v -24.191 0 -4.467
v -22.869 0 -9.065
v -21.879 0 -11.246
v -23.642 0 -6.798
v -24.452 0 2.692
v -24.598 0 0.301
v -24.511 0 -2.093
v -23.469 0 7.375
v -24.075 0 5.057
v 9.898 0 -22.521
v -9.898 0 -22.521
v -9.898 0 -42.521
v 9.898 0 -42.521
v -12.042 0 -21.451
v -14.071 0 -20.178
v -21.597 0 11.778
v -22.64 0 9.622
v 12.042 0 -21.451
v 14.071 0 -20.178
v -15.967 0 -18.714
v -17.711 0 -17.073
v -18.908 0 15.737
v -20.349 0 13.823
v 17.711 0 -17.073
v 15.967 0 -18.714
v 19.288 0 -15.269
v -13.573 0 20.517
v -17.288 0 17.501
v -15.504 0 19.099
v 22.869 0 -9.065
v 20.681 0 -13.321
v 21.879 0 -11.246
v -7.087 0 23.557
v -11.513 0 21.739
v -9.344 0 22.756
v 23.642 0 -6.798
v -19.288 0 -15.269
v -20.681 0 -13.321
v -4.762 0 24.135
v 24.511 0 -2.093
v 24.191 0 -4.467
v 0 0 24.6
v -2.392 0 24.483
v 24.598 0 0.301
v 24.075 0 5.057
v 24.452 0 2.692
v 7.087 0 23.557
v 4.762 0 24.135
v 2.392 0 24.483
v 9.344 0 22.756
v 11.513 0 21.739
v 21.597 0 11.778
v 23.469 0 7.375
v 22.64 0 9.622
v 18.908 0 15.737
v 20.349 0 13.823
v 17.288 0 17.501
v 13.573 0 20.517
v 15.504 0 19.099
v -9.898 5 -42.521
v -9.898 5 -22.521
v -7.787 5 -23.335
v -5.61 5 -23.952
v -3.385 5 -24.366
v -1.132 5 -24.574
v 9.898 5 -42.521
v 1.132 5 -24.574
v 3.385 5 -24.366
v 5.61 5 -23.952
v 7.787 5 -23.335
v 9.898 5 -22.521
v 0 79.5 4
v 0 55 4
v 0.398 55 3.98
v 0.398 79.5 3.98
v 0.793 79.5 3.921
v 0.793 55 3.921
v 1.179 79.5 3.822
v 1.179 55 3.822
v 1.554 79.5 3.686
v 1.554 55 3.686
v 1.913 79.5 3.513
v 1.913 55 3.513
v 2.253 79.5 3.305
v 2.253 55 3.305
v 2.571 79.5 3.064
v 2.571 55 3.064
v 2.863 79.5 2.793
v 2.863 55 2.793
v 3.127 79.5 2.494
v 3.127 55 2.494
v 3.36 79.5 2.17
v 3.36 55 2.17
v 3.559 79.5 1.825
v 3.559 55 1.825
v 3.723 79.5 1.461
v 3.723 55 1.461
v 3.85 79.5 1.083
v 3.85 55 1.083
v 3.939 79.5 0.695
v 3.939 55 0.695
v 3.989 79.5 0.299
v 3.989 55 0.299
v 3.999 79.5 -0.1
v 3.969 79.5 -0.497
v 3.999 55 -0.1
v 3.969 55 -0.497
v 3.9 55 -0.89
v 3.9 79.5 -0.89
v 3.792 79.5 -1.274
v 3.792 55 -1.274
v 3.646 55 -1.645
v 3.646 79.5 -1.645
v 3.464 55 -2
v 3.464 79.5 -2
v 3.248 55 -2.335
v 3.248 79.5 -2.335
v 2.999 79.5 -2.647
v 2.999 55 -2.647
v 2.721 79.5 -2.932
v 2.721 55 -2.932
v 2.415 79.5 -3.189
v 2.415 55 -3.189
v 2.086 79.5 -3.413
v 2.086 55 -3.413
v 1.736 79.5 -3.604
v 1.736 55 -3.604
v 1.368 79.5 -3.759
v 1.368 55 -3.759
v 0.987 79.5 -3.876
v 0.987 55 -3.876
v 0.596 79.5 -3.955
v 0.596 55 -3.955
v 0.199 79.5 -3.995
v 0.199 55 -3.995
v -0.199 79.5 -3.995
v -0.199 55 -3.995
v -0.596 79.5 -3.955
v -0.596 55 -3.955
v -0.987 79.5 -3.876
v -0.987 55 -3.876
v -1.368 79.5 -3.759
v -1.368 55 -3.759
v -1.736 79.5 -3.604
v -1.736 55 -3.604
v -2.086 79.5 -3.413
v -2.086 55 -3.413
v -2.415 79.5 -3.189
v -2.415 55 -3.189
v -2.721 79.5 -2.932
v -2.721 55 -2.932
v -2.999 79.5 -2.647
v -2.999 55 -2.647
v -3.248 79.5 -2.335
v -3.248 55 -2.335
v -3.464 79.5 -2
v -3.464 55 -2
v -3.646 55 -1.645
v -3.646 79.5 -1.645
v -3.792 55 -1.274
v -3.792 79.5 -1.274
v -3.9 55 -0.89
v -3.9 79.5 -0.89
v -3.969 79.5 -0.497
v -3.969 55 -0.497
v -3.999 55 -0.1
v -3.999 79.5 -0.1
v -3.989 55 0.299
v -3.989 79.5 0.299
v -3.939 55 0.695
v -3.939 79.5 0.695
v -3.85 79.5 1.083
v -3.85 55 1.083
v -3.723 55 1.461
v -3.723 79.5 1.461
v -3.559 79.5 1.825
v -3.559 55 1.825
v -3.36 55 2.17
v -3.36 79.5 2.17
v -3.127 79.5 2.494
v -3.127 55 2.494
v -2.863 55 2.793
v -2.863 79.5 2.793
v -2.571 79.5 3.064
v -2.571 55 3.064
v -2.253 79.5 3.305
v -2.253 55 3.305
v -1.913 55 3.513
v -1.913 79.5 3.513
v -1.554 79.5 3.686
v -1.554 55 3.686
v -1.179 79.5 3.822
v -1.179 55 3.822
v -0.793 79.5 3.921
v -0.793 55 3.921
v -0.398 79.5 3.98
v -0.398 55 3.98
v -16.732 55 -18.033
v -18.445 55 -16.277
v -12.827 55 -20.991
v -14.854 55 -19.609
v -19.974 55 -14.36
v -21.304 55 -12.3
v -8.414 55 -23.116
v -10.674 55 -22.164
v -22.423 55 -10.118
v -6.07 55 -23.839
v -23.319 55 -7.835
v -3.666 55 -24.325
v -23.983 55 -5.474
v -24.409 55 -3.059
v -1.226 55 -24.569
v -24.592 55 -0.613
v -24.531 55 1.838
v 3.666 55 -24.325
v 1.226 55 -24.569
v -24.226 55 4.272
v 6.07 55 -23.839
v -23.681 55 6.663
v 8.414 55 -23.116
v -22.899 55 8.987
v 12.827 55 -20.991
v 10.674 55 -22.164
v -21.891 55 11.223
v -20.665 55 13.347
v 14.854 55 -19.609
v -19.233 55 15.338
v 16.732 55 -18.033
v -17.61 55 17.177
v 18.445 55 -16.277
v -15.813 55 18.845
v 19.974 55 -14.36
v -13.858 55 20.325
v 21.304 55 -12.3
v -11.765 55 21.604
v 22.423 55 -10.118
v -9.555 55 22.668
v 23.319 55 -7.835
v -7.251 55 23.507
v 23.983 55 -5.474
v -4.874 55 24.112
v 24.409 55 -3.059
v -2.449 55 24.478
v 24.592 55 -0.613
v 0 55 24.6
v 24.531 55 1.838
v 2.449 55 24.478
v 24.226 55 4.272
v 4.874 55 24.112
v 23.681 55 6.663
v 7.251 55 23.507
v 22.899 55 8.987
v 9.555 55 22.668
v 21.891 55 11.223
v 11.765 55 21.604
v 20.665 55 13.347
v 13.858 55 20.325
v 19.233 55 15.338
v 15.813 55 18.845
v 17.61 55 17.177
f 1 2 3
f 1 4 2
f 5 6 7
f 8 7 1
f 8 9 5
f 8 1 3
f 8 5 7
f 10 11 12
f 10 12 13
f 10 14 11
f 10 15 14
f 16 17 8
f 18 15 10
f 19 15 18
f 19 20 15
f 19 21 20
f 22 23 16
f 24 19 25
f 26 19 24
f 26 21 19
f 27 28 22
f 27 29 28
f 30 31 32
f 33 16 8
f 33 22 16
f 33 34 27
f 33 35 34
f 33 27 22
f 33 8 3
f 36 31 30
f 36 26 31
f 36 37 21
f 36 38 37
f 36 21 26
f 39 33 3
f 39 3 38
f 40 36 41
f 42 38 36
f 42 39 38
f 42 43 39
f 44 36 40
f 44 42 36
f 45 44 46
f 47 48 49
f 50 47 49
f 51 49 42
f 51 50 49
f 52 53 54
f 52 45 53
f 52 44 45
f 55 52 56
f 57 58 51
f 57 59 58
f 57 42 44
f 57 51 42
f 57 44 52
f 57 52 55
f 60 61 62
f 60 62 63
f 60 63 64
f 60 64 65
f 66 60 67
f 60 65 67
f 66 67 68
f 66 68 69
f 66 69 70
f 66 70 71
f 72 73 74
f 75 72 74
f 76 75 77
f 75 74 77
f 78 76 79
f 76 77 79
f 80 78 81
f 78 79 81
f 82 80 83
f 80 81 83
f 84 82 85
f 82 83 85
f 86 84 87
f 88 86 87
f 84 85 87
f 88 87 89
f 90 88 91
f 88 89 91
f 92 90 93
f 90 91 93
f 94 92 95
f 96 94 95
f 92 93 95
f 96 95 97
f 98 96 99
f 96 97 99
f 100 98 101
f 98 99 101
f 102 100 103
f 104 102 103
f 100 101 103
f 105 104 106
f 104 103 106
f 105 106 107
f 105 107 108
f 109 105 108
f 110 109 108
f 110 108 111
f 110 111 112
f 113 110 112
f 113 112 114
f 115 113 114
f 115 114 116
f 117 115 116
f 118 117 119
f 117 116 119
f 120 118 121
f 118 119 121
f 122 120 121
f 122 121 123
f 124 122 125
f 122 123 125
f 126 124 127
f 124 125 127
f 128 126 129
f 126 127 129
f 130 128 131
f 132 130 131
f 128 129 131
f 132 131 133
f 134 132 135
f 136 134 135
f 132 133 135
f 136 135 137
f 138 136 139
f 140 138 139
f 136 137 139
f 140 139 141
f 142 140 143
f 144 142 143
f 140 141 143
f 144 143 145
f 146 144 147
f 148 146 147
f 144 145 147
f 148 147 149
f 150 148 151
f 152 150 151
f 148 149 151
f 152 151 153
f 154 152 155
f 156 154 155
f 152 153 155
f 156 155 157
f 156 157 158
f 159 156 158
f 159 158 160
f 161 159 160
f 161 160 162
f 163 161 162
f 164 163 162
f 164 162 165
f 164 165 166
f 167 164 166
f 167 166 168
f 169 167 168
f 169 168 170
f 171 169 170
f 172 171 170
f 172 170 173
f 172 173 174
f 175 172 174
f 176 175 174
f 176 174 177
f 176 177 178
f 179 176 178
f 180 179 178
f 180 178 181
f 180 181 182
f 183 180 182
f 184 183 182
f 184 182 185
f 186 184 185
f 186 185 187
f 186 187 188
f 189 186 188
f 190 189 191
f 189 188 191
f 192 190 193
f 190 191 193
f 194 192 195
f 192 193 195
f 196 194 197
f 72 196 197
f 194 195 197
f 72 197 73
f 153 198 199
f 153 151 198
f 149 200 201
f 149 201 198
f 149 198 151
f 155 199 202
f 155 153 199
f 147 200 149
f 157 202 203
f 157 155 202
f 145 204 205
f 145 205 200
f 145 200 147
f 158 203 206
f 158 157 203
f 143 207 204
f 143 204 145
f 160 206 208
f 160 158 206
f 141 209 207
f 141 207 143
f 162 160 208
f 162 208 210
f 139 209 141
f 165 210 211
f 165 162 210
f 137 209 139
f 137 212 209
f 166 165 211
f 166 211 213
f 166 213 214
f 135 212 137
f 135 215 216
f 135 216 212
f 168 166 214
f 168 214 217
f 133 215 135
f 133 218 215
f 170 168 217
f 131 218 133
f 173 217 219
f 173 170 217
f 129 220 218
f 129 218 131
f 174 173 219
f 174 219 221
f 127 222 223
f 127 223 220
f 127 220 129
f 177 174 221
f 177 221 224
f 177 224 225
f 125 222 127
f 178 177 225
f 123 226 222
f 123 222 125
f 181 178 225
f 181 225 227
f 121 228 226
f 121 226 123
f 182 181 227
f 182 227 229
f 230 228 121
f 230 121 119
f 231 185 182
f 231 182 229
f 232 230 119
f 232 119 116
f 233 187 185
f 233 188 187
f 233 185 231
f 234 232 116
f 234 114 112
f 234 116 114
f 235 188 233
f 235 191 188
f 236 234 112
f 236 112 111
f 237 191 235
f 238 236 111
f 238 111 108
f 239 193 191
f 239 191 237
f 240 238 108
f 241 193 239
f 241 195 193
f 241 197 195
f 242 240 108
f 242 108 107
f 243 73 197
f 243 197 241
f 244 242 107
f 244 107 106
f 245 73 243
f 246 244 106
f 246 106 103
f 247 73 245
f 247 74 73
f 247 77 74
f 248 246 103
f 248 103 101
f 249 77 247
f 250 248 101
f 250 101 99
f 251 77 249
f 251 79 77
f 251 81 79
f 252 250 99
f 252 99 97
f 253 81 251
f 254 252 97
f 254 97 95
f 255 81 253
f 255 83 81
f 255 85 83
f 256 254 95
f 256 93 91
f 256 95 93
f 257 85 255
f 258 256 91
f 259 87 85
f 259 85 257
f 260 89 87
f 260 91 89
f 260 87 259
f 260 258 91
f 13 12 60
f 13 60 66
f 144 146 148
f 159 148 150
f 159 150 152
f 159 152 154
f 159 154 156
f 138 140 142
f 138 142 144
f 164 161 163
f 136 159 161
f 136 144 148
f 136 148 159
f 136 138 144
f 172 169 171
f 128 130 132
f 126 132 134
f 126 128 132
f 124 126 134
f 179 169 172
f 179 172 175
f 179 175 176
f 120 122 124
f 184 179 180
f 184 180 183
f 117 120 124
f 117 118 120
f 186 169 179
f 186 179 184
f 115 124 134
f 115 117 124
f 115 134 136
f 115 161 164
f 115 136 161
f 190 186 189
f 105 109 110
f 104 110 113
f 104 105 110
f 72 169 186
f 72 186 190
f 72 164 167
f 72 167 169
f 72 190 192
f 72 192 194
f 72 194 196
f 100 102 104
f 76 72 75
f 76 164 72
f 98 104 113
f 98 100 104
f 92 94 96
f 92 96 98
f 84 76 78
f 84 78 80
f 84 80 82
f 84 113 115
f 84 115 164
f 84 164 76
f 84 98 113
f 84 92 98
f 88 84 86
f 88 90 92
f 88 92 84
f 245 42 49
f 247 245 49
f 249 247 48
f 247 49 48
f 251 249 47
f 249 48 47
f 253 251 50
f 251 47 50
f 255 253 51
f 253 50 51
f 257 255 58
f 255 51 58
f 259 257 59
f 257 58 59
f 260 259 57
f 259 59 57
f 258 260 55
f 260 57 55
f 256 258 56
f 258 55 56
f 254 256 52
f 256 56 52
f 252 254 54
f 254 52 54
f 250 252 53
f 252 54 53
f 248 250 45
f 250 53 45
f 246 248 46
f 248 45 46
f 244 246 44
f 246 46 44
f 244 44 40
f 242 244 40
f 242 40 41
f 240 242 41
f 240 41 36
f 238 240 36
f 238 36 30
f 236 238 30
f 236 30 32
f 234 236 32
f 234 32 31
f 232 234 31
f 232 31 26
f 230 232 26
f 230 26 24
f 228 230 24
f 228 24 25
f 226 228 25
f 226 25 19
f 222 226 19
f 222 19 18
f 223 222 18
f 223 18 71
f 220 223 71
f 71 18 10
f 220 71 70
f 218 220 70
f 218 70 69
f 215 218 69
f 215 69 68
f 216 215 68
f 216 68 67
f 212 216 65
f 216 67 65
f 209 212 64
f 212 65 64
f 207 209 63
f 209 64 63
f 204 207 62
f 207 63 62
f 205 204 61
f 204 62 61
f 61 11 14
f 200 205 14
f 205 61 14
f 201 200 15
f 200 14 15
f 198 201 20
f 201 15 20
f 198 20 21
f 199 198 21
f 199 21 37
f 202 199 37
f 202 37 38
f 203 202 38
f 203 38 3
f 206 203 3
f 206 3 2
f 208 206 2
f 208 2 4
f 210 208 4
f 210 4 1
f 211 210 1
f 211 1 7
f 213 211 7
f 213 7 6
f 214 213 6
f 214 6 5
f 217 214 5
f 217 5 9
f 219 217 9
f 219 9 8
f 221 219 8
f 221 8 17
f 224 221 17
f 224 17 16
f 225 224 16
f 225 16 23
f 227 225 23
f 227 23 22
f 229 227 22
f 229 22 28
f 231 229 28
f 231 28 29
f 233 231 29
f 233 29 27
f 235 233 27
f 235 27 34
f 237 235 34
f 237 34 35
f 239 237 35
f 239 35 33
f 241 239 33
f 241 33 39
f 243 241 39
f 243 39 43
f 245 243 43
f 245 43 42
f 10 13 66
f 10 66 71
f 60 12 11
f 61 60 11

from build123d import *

# Parameters (mm, degrees)
SKETCH1_R           = 24.6
BOSS_EXTRUDE1_DEPTH = 55
SKETCH2_R           = 4
BOSS_EXTRUDE2_DEPTH = 24.5
SKETCH3_W           = 19.796892184
SKETCH3_H           = 20
BOSS_EXTRUDE3_DEPTH = 5


with BuildPart() as part:
    # Sketch1 → Boss-Extrude1 (new body)
    with BuildSketch(Plane(origin=(0, 0, 0), x_dir=(1, 0, 0), z_dir=(0, 1, 0))):
        with Locations(Location((0, 0, 0), (0, 0, 270))):
            Circle(SKETCH1_R)
    extrude(amount=BOSS_EXTRUDE1_DEPTH)

    # Sketch2 → Boss-Extrude2 (add)
    with BuildSketch(Plane(origin=(0, 55, 0), x_dir=(1, 0, 0), z_dir=(0, 1, 0))):
        with Locations(Location((0, 0, 0), (0, 0, 270))):
            Circle(SKETCH2_R)
    extrude(amount=BOSS_EXTRUDE2_DEPTH)

    # Sketch3 → Boss-Extrude3 (add)
    with BuildSketch(Plane.XZ):
        with Locations((0, -32.520674168)):
            Rectangle(SKETCH3_W, SKETCH3_H)
    extrude(amount=-BOSS_EXTRUDE3_DEPTH)


solid = part.part
